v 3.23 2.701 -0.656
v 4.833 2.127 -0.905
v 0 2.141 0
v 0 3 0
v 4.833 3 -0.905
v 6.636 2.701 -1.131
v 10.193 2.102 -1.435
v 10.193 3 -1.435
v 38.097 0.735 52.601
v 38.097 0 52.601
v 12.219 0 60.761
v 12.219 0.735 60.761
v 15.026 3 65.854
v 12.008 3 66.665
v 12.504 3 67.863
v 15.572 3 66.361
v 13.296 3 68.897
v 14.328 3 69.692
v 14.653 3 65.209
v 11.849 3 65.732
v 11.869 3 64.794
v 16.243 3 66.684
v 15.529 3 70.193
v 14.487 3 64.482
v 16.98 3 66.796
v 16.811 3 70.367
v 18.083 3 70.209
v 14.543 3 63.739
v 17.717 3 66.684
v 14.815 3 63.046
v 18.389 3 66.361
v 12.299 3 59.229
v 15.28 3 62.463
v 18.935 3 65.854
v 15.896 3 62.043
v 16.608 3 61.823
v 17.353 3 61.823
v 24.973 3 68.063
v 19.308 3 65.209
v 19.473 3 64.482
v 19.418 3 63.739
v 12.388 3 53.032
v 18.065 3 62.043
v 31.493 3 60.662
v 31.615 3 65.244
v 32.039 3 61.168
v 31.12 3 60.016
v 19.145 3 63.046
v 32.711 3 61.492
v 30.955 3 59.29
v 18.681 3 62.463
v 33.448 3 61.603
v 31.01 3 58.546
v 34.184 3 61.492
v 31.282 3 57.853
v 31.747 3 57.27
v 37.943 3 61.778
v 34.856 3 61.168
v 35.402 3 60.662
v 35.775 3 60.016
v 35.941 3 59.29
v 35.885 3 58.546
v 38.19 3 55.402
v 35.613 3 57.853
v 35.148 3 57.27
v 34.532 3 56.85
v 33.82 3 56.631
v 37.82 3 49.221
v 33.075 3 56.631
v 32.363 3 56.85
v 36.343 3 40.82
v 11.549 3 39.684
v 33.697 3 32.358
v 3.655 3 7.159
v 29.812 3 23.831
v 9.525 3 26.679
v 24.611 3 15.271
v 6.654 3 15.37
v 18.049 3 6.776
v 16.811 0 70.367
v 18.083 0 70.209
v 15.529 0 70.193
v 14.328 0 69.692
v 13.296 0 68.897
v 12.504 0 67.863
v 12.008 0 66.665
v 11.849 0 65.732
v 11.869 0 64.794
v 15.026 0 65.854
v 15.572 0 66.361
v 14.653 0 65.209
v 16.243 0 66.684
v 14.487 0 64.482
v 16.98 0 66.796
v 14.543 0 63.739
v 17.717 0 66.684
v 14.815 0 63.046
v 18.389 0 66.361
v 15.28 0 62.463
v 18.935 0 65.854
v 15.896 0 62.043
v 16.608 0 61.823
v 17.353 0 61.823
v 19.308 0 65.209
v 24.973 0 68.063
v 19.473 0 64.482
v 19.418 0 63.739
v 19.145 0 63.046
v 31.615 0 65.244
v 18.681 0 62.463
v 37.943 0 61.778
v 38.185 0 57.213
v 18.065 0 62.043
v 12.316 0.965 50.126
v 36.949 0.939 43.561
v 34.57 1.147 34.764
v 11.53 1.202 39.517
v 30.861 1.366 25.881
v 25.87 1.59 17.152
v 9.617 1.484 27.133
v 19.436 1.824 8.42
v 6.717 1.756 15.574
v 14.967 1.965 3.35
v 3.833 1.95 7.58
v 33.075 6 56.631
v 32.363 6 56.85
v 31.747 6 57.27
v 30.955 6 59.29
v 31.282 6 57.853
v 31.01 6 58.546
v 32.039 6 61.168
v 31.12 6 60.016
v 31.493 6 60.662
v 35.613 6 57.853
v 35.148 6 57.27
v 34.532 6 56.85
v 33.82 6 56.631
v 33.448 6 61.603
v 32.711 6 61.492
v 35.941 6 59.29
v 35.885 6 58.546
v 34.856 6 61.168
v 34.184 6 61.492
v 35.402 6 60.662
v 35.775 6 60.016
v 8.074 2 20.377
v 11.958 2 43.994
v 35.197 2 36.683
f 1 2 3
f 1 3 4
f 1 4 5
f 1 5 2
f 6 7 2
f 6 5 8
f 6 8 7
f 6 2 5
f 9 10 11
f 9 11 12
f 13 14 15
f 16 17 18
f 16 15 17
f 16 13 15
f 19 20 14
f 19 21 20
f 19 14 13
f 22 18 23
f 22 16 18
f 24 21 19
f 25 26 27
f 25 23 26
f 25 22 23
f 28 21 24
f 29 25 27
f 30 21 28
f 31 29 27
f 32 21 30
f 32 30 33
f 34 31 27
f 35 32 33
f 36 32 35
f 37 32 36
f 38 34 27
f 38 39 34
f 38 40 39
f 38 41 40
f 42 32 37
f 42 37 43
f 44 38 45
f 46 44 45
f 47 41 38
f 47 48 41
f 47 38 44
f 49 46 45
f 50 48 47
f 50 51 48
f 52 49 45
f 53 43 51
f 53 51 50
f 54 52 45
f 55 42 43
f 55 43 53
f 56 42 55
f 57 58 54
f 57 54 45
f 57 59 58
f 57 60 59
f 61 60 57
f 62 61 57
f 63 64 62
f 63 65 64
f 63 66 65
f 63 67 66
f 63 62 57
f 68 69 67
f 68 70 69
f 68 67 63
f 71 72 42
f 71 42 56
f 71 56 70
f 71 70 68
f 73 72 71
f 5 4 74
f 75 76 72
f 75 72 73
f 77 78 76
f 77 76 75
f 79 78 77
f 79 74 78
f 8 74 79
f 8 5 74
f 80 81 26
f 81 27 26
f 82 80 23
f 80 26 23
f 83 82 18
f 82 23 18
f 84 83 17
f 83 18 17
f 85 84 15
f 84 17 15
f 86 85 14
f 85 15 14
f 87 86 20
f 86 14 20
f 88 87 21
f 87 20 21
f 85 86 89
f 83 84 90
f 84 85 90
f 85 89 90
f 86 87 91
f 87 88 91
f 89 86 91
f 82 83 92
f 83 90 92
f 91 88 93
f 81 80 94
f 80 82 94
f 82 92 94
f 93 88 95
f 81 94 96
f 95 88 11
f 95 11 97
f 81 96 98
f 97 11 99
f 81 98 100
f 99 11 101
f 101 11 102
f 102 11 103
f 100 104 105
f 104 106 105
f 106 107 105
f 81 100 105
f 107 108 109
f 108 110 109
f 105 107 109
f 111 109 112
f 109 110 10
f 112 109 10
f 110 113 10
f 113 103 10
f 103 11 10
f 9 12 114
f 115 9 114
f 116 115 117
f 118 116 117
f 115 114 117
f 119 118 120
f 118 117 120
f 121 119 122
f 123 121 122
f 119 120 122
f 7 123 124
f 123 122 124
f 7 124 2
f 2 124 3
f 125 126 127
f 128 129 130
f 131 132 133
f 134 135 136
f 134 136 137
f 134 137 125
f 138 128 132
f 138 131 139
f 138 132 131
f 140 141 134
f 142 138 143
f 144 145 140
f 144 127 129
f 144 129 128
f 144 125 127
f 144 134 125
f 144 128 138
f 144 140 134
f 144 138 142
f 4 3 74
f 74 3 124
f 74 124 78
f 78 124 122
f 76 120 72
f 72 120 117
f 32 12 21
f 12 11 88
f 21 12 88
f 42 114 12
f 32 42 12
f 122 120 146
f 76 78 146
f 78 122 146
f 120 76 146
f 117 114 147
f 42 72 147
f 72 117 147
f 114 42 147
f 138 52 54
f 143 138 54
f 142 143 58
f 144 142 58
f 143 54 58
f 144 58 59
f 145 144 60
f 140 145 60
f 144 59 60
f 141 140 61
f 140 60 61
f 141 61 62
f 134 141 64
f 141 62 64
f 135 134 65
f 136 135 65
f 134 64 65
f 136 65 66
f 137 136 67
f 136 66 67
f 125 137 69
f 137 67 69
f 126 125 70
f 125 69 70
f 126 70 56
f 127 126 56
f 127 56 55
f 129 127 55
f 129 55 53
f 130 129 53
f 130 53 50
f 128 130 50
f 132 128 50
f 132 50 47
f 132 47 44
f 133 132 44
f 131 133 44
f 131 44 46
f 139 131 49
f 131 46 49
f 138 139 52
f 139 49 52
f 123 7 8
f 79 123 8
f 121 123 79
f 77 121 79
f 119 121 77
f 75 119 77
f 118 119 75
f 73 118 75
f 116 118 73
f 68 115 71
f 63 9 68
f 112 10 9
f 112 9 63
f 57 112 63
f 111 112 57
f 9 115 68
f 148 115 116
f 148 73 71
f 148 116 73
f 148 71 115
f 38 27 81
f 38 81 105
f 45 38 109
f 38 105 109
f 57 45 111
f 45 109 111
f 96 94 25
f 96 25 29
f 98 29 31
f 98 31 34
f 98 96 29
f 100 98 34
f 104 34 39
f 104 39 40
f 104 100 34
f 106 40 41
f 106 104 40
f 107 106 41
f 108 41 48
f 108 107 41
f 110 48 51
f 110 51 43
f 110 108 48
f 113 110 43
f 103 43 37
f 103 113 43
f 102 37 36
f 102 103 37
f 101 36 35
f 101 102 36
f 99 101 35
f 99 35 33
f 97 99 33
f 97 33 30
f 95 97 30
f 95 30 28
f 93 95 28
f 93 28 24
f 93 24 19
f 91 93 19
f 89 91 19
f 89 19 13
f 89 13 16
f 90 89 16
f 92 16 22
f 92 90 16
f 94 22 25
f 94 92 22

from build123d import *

# Parameters (mm, degrees)
EXTRUDE_2_DEPTH          = 3
SKETCH_6_R               = 2.5
CUT_EXTRUDE_3_DEPTH      = 3
FILLET_1_R               = 5
EXTRUDE_START            = 3
SKETCH_12_R              = 2.5
EXTRUDE_3_DEPTH          = 3
CUT_EXTRUDE_4_DEPTH      = 53.075400229
CUT_EXTRUDE_4_DEPTH_BACK = 53.075400229


with BuildPart() as part:
    # 草图5 → 凸台-拉伸2 (new body)
    with BuildSketch(Plane(origin=(0, 0, 0), x_dir=(1, 0, 0), z_dir=(0, 1, 0))):
        with BuildLine():
            ThreePointArc((10.559870576, -71.726836912), (50.703091685, -51.821293824), (71.479455105, -12.121777836))
            add(Edge.make_bspline(
                [(0, 0), (21.999765175, 5.26655471), (58.910704789, -3.551422078), (71.479455105, -12.121777836)],
                knots=[0, 0, 0, 0, 1, 1, 1, 1], degree=3))
            add(Edge.make_bspline(
                [(0, 0), (11.807092486, -19.295565119), (14.826805821, -57.124859445), (10.559870576, -71.726836912)],
                knots=[0, 0, 0, 0, 1, 1, 1, 1], degree=3))
        make_face()
    extrude(amount=EXTRUDE_2_DEPTH)

    # 草图6 → 切除-拉伸3 (cut)
    with BuildSketch(Plane(origin=(0, 0, 0), x_dir=(1, 0, 0), z_dir=(0, 1, 0))):
        with Locations(Location((16.980367579, -64.295545078, 0), (0, 0, 270))):
            Circle(SKETCH_6_R)
        with BuildLine():
            Line((10.193167245, 1.43451668), (79.733938156, 38.033041096))
            Line((79.733938156, 38.033041096), (67.619590309, -86.298423653))
            Line((67.619590309, -86.298423653), (37.943421347, -61.778206323))
            add(Edge.make_bspline(
                [(10.193167245, 1.43451668), (25.470457842, -12.985420951), (40.3134982, -34.977892419), (37.943421347, -61.778206323)],
                knots=[0, 0, 0, 0, 1, 1, 1, 1], degree=3))
        make_face()
    extrude(amount=CUT_EXTRUDE_3_DEPTH, mode=Mode.SUBTRACT)

    # 圆角1
    fillet_1_edges = [part.edges().sort_by_distance(p)[0] for p in [
        (10.559870576, 1.5, 71.726836912),
    ]]
    fillet(fillet_1_edges, radius=FILLET_1_R)

    # 草图12 → 凸台-拉伸3 (add)
    with BuildSketch(Plane(origin=(0, 0, 0), x_dir=(1, 0, 0), z_dir=(0, 1, 0)).offset(EXTRUDE_START)):
        with Locations(Location((33.447510377, -59.102789962, 0), (0, 0, 270))):
            Circle(SKETCH_12_R)
    extrude(amount=EXTRUDE_3_DEPTH)

    # 草图15 → 切除-拉伸4 (cut, two sides: drawn at the far end of the back side and taken through both)
    with BuildSketch(Plane(origin=(20.307849495, 0, 46.141092032), x_dir=(-0.3007418808113313, 0, -0.9537055736054305), z_dir=(0.9537055736054305, 0, -0.3007418808113313)).offset(-CUT_EXTRUDE_4_DEPTH_BACK)):
        Polygon((-11.510635463, 0.734616999), (50.112437496, 2.140825412), (51.673202283, 2.140825412), (51.673202283, -11.401301697), (-11.510635463, -3.981764366), align=None)
    extrude(amount=CUT_EXTRUDE_4_DEPTH + CUT_EXTRUDE_4_DEPTH_BACK, mode=Mode.SUBTRACT)


solid = part.part
